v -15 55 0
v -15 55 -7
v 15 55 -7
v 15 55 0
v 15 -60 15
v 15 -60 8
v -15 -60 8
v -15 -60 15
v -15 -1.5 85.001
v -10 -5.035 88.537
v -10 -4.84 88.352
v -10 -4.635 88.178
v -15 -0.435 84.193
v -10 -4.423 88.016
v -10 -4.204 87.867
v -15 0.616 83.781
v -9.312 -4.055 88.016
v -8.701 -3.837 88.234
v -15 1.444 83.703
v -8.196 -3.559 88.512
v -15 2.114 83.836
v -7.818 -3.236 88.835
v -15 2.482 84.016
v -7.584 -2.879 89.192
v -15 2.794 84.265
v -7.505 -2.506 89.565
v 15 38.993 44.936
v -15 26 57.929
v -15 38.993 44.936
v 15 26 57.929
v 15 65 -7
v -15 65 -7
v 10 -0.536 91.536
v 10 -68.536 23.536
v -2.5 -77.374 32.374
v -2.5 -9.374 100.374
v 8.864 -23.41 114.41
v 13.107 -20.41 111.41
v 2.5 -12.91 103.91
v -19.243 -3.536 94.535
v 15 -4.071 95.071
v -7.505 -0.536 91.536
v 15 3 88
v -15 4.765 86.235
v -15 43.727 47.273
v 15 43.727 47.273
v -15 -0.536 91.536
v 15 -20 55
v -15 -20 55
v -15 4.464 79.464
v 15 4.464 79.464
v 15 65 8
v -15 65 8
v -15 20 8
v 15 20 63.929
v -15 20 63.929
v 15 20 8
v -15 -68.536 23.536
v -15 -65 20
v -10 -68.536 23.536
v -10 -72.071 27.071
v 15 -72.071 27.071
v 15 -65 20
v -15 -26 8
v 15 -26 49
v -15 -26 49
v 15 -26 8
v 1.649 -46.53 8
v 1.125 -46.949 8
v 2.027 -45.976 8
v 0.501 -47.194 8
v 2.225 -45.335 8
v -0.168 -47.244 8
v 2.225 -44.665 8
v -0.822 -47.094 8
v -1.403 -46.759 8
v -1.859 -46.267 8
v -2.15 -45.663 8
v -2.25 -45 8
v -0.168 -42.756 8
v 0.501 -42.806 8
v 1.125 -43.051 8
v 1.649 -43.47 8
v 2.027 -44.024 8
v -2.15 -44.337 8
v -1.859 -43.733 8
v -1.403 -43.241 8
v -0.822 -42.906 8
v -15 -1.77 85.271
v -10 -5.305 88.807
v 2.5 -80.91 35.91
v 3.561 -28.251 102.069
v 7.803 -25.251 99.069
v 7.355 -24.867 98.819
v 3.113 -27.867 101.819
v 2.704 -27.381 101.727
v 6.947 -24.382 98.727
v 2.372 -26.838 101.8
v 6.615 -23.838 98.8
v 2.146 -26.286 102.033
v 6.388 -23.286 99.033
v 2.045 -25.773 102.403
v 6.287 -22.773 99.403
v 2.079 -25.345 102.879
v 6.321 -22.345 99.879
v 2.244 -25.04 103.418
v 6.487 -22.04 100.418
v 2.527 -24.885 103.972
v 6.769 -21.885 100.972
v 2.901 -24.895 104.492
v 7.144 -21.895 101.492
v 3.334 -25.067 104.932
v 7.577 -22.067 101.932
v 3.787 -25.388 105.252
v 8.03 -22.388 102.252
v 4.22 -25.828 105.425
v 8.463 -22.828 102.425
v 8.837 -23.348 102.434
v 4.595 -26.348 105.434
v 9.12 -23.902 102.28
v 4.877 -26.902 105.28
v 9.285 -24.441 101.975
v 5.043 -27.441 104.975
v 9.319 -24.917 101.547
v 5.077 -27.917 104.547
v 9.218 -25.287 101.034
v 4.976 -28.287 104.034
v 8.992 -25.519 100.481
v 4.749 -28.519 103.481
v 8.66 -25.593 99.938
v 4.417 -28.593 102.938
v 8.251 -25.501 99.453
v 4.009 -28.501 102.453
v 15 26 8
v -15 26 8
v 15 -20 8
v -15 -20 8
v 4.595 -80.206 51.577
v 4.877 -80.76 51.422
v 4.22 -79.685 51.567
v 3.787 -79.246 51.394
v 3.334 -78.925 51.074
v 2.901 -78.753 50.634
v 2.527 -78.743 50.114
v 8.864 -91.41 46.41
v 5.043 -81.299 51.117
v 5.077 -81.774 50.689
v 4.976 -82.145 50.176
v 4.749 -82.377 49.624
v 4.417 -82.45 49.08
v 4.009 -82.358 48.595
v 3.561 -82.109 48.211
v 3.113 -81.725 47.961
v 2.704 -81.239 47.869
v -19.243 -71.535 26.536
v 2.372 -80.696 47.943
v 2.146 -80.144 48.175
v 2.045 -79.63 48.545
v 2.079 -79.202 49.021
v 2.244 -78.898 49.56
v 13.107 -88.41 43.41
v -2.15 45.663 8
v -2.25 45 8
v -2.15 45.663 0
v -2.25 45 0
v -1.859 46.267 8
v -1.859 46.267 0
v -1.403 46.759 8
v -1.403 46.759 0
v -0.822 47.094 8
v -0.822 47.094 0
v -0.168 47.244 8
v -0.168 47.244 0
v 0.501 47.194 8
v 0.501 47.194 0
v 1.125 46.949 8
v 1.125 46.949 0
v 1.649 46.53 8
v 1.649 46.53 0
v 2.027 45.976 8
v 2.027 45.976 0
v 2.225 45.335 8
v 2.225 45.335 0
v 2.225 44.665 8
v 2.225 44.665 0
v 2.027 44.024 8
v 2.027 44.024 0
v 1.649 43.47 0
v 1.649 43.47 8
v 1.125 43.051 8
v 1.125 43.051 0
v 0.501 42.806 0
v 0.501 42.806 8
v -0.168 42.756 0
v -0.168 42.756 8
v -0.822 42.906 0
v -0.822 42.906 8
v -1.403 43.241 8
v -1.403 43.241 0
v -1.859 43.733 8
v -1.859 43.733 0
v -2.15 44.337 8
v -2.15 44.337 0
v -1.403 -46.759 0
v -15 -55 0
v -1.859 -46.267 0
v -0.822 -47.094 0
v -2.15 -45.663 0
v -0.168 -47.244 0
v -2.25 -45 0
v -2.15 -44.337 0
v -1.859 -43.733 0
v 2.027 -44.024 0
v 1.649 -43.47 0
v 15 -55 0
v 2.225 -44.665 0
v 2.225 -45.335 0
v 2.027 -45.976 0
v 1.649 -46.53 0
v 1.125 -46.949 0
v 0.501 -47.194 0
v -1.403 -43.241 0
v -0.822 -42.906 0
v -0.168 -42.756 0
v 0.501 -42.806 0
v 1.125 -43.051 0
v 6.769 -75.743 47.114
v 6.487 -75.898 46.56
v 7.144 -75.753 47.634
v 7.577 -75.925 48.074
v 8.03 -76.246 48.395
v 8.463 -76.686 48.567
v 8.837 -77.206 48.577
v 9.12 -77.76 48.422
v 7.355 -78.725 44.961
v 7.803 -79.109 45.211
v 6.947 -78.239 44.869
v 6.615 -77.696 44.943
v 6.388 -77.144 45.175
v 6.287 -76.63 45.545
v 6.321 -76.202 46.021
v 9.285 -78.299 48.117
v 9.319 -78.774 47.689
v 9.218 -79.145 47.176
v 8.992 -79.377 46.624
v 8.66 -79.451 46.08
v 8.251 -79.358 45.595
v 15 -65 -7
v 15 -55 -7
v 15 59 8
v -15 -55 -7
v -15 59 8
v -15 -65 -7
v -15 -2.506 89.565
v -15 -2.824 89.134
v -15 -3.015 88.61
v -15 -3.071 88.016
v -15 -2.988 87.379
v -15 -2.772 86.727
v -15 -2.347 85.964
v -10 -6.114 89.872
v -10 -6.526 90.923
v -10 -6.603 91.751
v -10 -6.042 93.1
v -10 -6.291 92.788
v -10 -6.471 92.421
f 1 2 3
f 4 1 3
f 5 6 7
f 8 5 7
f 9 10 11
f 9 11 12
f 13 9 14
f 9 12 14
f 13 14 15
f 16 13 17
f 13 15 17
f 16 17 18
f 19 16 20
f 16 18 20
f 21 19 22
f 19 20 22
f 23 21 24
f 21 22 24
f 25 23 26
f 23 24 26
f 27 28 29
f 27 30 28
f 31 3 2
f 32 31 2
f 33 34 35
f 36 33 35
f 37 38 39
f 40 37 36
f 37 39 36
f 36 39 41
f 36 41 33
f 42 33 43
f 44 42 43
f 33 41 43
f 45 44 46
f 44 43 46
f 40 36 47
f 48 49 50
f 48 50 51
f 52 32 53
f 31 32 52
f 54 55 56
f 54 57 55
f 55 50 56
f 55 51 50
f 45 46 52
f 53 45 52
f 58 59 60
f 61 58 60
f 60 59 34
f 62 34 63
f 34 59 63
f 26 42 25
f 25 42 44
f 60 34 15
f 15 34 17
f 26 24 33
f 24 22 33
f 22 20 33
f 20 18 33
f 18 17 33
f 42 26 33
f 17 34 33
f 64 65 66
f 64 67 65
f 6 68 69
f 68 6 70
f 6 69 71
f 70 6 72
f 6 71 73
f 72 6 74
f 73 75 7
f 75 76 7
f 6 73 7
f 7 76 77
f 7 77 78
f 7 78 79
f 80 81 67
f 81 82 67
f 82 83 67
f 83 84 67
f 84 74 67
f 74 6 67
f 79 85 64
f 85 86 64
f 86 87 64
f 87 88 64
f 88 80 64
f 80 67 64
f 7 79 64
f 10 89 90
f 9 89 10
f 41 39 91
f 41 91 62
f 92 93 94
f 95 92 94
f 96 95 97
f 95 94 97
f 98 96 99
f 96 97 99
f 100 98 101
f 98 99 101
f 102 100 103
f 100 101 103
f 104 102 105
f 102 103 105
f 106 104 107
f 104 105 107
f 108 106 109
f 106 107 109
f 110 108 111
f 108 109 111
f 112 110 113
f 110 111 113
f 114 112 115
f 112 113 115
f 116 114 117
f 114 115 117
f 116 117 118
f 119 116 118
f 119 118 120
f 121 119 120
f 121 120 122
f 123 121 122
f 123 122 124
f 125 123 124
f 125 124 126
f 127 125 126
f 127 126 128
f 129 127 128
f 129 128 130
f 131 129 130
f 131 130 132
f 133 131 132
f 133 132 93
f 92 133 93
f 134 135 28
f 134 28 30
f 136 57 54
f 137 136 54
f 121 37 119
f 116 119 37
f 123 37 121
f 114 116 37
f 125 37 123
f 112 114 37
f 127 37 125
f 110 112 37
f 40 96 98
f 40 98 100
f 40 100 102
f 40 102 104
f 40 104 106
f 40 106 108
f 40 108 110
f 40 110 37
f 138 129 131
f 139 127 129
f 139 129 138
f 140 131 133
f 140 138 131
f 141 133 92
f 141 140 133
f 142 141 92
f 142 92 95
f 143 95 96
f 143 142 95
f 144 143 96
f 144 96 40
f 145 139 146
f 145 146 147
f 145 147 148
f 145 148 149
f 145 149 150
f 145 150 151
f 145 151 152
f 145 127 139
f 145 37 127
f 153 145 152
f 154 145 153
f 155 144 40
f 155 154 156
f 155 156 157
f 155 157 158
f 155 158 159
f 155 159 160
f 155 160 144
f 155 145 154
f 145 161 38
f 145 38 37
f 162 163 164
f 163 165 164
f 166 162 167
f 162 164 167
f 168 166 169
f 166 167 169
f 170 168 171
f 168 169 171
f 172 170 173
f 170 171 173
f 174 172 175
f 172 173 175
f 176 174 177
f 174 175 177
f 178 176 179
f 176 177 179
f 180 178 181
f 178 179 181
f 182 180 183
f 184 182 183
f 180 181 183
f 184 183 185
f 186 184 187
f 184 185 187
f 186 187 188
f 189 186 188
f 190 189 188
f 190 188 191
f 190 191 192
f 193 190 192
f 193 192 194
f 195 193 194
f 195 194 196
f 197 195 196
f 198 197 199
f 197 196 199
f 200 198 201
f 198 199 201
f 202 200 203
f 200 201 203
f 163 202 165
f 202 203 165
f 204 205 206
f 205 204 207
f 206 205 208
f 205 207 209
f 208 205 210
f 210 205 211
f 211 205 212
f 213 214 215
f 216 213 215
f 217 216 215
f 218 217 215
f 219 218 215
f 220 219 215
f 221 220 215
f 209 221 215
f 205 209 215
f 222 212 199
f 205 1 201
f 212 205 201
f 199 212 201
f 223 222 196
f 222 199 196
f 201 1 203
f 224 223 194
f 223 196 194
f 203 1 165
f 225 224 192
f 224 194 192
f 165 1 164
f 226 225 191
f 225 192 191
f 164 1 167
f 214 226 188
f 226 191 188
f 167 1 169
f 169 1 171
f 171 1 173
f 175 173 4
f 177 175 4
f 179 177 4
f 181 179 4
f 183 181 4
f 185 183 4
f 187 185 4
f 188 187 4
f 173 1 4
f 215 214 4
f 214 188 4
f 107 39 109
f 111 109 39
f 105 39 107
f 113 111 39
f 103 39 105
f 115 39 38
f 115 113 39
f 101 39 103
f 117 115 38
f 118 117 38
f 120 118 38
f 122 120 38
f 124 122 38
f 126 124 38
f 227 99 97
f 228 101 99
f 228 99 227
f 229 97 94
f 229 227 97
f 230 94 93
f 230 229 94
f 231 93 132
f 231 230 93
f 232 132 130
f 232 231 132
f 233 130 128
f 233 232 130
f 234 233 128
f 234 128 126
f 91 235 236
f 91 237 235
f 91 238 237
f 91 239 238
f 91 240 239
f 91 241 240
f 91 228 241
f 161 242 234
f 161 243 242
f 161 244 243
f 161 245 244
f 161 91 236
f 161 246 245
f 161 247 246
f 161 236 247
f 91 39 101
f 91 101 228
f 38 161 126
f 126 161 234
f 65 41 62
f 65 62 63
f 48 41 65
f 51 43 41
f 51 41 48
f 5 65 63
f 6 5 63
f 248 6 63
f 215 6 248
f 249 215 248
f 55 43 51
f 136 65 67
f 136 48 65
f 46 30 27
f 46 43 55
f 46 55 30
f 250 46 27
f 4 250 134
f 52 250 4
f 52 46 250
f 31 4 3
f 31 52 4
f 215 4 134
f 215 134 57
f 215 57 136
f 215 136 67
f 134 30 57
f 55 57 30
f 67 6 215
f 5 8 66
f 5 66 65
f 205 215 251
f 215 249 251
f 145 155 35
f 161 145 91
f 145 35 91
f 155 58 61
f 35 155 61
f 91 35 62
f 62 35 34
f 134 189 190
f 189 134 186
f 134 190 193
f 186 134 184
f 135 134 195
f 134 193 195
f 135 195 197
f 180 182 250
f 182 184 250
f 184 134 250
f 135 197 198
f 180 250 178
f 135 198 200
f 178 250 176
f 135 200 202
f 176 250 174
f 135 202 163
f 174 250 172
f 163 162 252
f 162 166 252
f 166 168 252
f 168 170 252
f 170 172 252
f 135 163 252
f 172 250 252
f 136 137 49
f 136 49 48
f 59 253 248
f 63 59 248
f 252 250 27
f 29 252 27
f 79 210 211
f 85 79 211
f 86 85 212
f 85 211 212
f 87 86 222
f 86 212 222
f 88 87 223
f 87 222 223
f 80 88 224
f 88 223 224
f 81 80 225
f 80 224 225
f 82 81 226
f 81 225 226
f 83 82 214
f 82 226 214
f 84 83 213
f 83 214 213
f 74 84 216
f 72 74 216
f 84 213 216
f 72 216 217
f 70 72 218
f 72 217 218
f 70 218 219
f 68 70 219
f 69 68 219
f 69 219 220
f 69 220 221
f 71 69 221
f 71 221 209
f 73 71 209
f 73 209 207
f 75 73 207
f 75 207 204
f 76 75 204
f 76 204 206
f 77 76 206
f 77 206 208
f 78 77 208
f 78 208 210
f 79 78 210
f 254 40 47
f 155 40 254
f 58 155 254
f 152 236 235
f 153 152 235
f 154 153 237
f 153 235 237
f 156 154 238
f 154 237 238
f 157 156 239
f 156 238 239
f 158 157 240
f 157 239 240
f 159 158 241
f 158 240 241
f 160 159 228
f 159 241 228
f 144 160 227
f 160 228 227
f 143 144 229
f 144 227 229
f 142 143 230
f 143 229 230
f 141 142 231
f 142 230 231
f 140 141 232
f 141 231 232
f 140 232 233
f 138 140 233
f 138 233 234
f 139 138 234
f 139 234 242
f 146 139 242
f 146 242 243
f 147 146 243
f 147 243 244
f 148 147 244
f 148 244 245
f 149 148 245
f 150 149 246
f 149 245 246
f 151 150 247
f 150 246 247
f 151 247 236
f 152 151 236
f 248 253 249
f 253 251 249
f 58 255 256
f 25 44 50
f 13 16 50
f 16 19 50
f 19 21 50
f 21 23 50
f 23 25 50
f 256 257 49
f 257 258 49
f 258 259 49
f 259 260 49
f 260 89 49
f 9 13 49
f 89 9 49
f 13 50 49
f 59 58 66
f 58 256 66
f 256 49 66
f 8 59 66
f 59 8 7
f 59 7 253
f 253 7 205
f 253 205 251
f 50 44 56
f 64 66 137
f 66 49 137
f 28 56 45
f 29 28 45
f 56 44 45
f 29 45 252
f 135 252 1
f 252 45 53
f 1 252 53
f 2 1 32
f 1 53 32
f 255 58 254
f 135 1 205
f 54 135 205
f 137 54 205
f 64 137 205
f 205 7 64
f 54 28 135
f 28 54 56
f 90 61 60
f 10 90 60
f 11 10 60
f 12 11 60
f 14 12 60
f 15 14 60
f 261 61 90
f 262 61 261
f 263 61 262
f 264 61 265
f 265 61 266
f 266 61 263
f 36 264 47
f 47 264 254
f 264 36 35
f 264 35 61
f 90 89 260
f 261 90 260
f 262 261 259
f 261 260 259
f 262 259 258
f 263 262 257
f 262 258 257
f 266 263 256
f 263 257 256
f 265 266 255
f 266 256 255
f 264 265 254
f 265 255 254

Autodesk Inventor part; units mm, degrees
ref_plane "YZ Plane" through (0, 0, 0) normal (1, 0, 0) x (0, 1, 0)
ref_plane "XZ Plane" through (0, 0, 0) normal (0, 1, 0) x (-1, 0, 0)
ref_plane "XY Plane" through (0, 0, 0) normal (0, 0, 1) x (1, 0, 0)
ref_plane "Arbeitsebene1" through (0, 0, 0) normal (0, 0, 1) x (1, 0, 0)
sketch "Skizze1" plane through (0, 0, 0) normal (0, 0, 1) x (1, 0, 0)
  line L0 (15, 55) -> (-15, 55) projected
  line L1 (-15, 55) -> (-15, -55) projected
  line L2 (-15, -55) -> (15, -55) projected
  line L3 (15, -55) -> (15, 55) projected
  circle A0 centre (0, 45) radius 5 projected
  circle A1 centre (0, -45) radius 5 projected
  line L4 (15, 55) -> (-15, 55) projected
  line L5 (-15, 55) -> (-15, -55) projected
  line L6 (-15, -55) -> (15, -55) projected
  line L7 (15, -55) -> (15, 55) projected
  circle A2 centre (0, 45) radius 5 projected
  circle A3 centre (0, -45) radius 5 projected
  point P0 (0, 0)
ref_plane "Arbeitsebene2" through (0, -55, -5) normal (0, -1, 0) x (-1, 0, 0)
sketch "Skizze2" plane through (0, -55, -5) normal (0, -1, 0) x (-1, 0, 0)
  line L0 (15, 2) -> (-15, 2) projected
  line L1 (-15, 2) -> (-15, -2) projected
  line L2 (-15, -2) -> (-15, -5) projected
  line L3 (15, -5) -> (-15, -5) projected
  line L4 (15, 2) -> (15, -5) projected
  point P0 (0, -5)
extrude "Extrusion1" add sketch "Skizze2" along normal blind 10
sketch "Skizze3" plane through (-15, -55, 0) normal (0, 0, 1) x (1, 0, 0)
  line L0 (0, -10) -> (30, -10) projected
  line L1 (30, 0) -> (30, -10) projected
  line L2 (0, -10) -> (30, -10)
  line L3 (30, -10) -> (30, -5)
  line L4 (30, -5) -> (0, -5)
  line L5 (0, -5) -> (0, -10)
  point P0 (15, 55)
  dimension "d2" = 5
ref_plane "Arbeitsebene3" through (0, 55, -5) normal (0, 1, 0) x (1, 0, 0)
sketch "Skizze4" plane through (0, 55, -5) normal (0, 1, 0) x (1, 0, 0)
  line L0 (15, 2) -> (15, -5) projected
  line L1 (15, 2) -> (-15, 2) projected
  line L2 (-15, 2) -> (-15, -5) projected
  line L3 (15, -5) -> (-15, -5) projected
  point P0 (0, -5)
extrude "Extrusion2" add sketch "Skizze4" along normal blind 10
sketch "Skizze5" plane through (-15, 55, 0) normal (0, 0, 1) x (1, 0, 0)
  line L0 (0, 10) -> (30, 10) projected
  line L1 (0, 0) -> (0, 10) projected
  line L2 (30, 10) -> (0, 10)
  line L3 (0, 10) -> (0, 5)
  line L4 (0, 5) -> (30, 5)
  line L5 (30, 5) -> (30, 10)
  point P0 (15, -55)
  dimension "d5" = 5
extrude "Extrusion3" add sketch "Skizze3" along normal blind 20
sketch "Skizze6" plane through (15, -55, 0) normal (1, 0, 0) x (0, 0, -1)
  line L0 (7, -10) -> (-20, -10) projected
  line L1 (-20, -10) -> (-15, -5)
  line L2 (0, -5) -> (-20, -5) projected
  line L3 (-20, -10) -> (-12.9289, -10) construction
  line L4 (-20, -5) -> (-20, -10)
  point P0 (0, 55)
  dimension "d8" = 45
extrude "Extrusion4" cut sketch "Skizze6" against normal blind 46
sketch "Skizze7" plane through (-15, -60, 15) normal (0, 0.7071068, 0.7071068) x (1, 0, 0)
  line L0 (0, -7.0711) -> (0, 0) projected
  line L1 (0, -7.0711) -> (30, -7.0711) projected
  line L2 (30, 0) -> (30, -7.0711) projected
  line L3 (0, 0) -> (30, 0) projected
  point P0 (15, 53.033)
extrude "Extrusion5" add sketch "Skizze7" along normal blind 166
extrude "Extrusion6" add sketch "Skizze5" along normal blind 166
sketch "Skizze8" plane through (-15, 60, 0) normal (0, -1, 0) x (1, 0, 0)
  line L0 (30, 0) -> (0, 0) projected
  line L1 (30, 0) -> (30, 166) projected
  line L2 (0, 166) -> (30, 166) projected
  line L3 (0, 0) -> (0, 166) projected
  line L4 (0, 0) -> (0, 80)
  line L5 (0, 0) -> (0, 166) projected
  line L6 (0, 80) -> (30, 80)
  line L7 (0, 80) -> (30, 80)
  line L8 (30, 80) -> (30, 88)
  line L9 (30, 88) -> (0, 88)
  line L10 (0, 88) -> (0, 80)
  point P0 (15, 0)
  dimension "d15" = 80
  dimension "d16" = 8
extrude "Extrusion7" add sketch "Skizze8" along normal blind 57 contours L6 L3 L9 L1
sketch "Skizze9" plane through (-15, -65, -7) normal (-1, 0, 0) x (0, 0, 1)
  line L0 (27, 0) -> (144.3797, 117.3797) projected
  line L1 (139.3797, 122.3797) -> (144.3797, 117.3797) projected
  line L2 (95, 78) -> (139.3797, 122.3797) projected
  line L3 (95, 125) -> (95, 78) projected
  line L4 (95, 125) -> (173, 125) projected
  line L5 (173, 130) -> (173, 125) projected
  line L6 (0, 130) -> (173, 130) projected
  line L7 (0, 120) -> (0, 130) projected
  line L8 (0, 120) -> (7, 120) projected
  line L9 (7, 120) -> (7, 125) projected
  line L10 (7, 125) -> (87, 125) projected
  line L11 (87, 125) -> (87, 70) projected
  line L12 (22, 5) -> (87, 70) projected
  line L13 (7, 5) -> (22, 5) projected
  line L14 (7, 10) -> (7, 5) projected
  line L15 (7, 10) -> (0, 10) projected
  line L16 (0, 10) -> (0, 0) projected
  line L17 (0, 0) -> (27, 0) projected
  line L18 (95, 125) -> (95, 130)
  line L19 (95, 125) -> (95, 78) projected
  line L20 (95, 78) -> (95, 68)
  point P0 (7, 65)
extrude "Extrusion8" cut sketch "Skizze9" against normal blind 61.5 contours L20 L2 L1 L0 | L18 L6 L5 L4
sketch "Skizze10" plane through (-15, 60, 0) normal (0, -1, 0) x (1, 0, 0)
  line L0 (30, 0) -> (30, 80) projected
  line L1 (0, 0) -> (30, 0)
  line L2 (30, 0) -> (30, 8)
  line L3 (30, 8) -> (0, 8)
  line L4 (0, 8) -> (0, 0)
  point P0 (15, 0)
  dimension "d21" = 8
extrude "Extrusion9" add sketch "Skizze10" along normal blind 123.5
sketch "Skizze12" plane through (-15, 60, 8) normal (0, 0, 1) x (1, 0, 0)
  line L0 (30, -120) -> (0, -120) projected
  line L1 (30, 0) -> (30, -120) projected
  line L2 (0, 0) -> (30, 0) projected
  line L3 (0, 0) -> (0, -120) projected
  line L4 (15, -60) -> (30, -60)
  line L5 (30, 0) -> (30, -120) projected
  line L6 (30, -60) -> (30, -40)
  line L7 (30, -40) -> (30, -80)
  line L8 (0, 0) -> (0, -120) projected
  line L9 (30, -40) -> (0, -40)
  line L10 (0, -40) -> (0, -34)
  line L11 (0, -34) -> (30, -34)
  line L12 (30, -34) -> (30, -40)
  line L13 (30, -80) -> (0, -80)
  line L14 (0, -80) -> (0, -86)
  line L15 (0, -86) -> (30, -86)
  line L16 (30, -86) -> (30, -80)
  dimension "d26" = 20
  dimension "d27" = 40
  dimension "d28" = 6
  dimension "d29" = 6
extrude "Extrusion11" add sketch "Skizze12" along normal blind 76.5 contours L3 L11 L1 L9
sketch "Skizze13" plane through (-15, -60, 8) normal (0, 0, 1) x (1, 0, 0)
  line L0 (0, 80) -> (0, 40)
  line L1 (0, 80) -> (0, 0) projected
  line L2 (30, 80) -> (30, 0) projected
  line L3 (0, 40) -> (30, 40)
  line L4 (30, 40) -> (30, 34)
  line L5 (30, 34) -> (0, 34)
  line L6 (0, 34) -> (0, 40)
  point P0 (15, 60)
  point P1 (0, 34)
  point P2 (30, 40)
  dimension "d32" = 40
  dimension "d33" = 6
extrude "Extrusion12" add sketch "Skizze13" along normal blind 49.25
sketch "Skizze31" plane through (0, 0, 0) normal (0, 0, 1) x (1, 0, 0)
  point P0 (0, 0)
sketch "Skizze41" plane through (-15, -65, 20) normal (0, -0.7071068, 0.7071068) x (1, 0, 0)
  line L0 (30, 96.1665) -> (0, 96.1665) projected
  line L1 (0, 0) -> (0, 96.1665) projected
  line L2 (0, 0) -> (30, 0) projected
  line L3 (30, 0) -> (30, 96.1665) projected
  line L4 (0, 96.1665) -> (5, 96.1665)
  line L5 (5, 96.1665) -> (5, 0)
  line L6 (5, 0) -> (0, 0)
  line L7 (0, 0) -> (0, 96.1665)
  line L8 (30, 96.1665) -> (0, 96.1665) projected
  line L9 (30, 96.1665) -> (25, 96.1665)
  line L10 (25, 96.1665) -> (25, 0)
  line L11 (25, 0) -> (30, 0)
  line L12 (30, 0) -> (30, 96.1665)
  point P0 (15, 31.8198)
  dimension "d88" = 5
  dimension "d89" = 5
extrude "Extrusion34" add sketch "Skizze41" along normal blind 10 contours L3 L2 L10 L0 | L5 L2 L1 L0
sketch "Skizze42" plane through (-10, -65, 20) normal (0, -0.7071068, -0.7071068) x (-1, 0, 0)
  line L0 (5, 0) -> (0, 0) projected
  line L1 (0, 0) -> (0, -10) projected
  line L2 (5, -10) -> (0, -10) projected
  line L3 (5, 0) -> (5, -10) projected
  line L4 (-20, 0) -> (-25, 0) projected
  line L5 (-25, 0) -> (-25, -10) projected
  line L6 (-20, -10) -> (-25, -10) projected
  line L7 (-20, 0) -> (-20, -10) projected
  line L8 (0, -10) -> (5, -5)
  line L9 (-25, -10) -> (-20, -5)
  point P0 (-10, 60.1041)
extrude "Extrusion35" cut sketch "Skizze42" against normal blind 136 contours L3 L2 L8 | L7 L6 L9
sketch "Skizze43" plane through (-15, 3, 88) normal (0, 0.7071068, 0.7071068) x (1, 0, 0)
  line L0 (0, -5) -> (5, -10) projected
  line L1 (5, 0) -> (5, -10) projected
  line L2 (5, 0) -> (0, 0) projected
  line L3 (0, 0) -> (0, -5) projected
  line L4 (25, -5) -> (30, -10) projected
  line L5 (30, 0) -> (30, -10) projected
  line L6 (30, 0) -> (25, 0) projected
  line L7 (25, 0) -> (25, -5) projected
  point P0 (15, 60.1041)
extrude "Extrusion36" add sketch "Skizze43" along normal blind 45
sketch "Skizze48" plane through (-10, -65, 20) normal (0, -0.7071068, -0.7071068) x (-1, 0, 0)
  point P0 (-10, 60.1041)
sketch "Skizze49" plane through (-10, -65, 20) normal (0, -0.7071068, -0.7071068) x (-1, 0, 0)
  line L0 (-20, 0) -> (-20, -5) projected
  line L1 (-20, 0) -> (-25, 0) projected
  line L2 (-25, 0) -> (-25, -10) projected
  line L3 (5, 0) -> (5, -5) projected
  line L4 (5, 0) -> (0, 0) projected
  line L5 (0, 0) -> (0, -10) projected
  line L6 (44.1188, -44.1188) -> (39.1188, -49.1188)
  line L7 (31.6188, -56.6188) -> (26.6188, -61.6188)
  line L8 (-25, -10) -> (-20, -5) projected
  line L9 (0, -10) -> (5, -5) projected
  point P0 (-10, 60.1041)
extrude "Extrusion41" [suppressed]
sketch "Skizze50" plane through (-15, 34.8198, 119.8198) normal (0, 0.7071068, 0.7071068) x (1, 0, 0)
  line L0 (25, 0) -> (25, -5) projected
  line L1 (5, -10) -> (5, 0) projected
  line L2 (5, 0) -> (0, 0) projected
  line L3 (0, 0) -> (0, -5) projected
  line L4 (30, -10) -> (30, 0) projected
  line L5 (30, 0) -> (25, 0) projected
  line L6 (-34.1188, -49.1188) -> (-39.1188, -44.1188) projected
  line L7 (-21.6188, -61.6188) -> (-26.6188, -56.6188) projected
  line L8 (25, -5) -> (30, -10) projected
  line L9 (0, -5) -> (5, -10) projected
  point P0 (15, 60.1041)
extrude "Extrusion42" [suppressed]
sketch "Skizze51" plane through (15, 3, 88) normal (0, 0.7071068, -0.7071068) x (-1, 0, 0)
  line L0 (0, 0) -> (5, 0) projected
  line L1 (5, 0) -> (5, 45) projected
  line L2 (0, 45) -> (5, 45) projected
  line L3 (0, 0) -> (0, 45) projected
  line L4 (25, 0) -> (30, 0) projected
  line L5 (30, 0) -> (30, 45) projected
  line L6 (25, 45) -> (30, 45) projected
  line L7 (25, 0) -> (25, 45) projected
  line L8 (5, -96.1665) -> (5, 45) projected
  line L9 (0, 45) -> (5, 45)
  line L10 (5, 45) -> (5, 40)
  line L11 (5, 40) -> (0, 40)
  line L12 (0, 40) -> (0, 45)
  line L13 (25, 45) -> (30, 45) projected
  line L14 (25, 45) -> (30, 45)
  line L15 (30, 45) -> (30, 40)
  line L16 (30, 40) -> (25, 40)
  line L17 (25, 40) -> (25, 45)
  point P0 (15, -64.3467)
  point P1 (25, 40)
  point P2 (0, 40)
  point P3 (5, 40)
  dimension "d109" = 5
  dimension "d110" = 5
extrude "Extrusion43" add sketch "Skizze51" along normal blind 10 contours L3 L2 L1 L11 | L7 L6 L5 L16
sketch "Skizze52" plane through (15, -65, 20) normal (1, 0, 0) x (0, 0.7071068, -0.7071068)
  line L0 (0, 0) -> (0, 96.1665) projected
  line L1 (0, 96.1665) -> (0, 136.1665) projected
  line L2 (0, 136.1665) -> (10, 136.1665) projected
  line L3 (10, 141.1665) -> (10, 136.1665) projected
  line L4 (-10, 141.1665) -> (10, 141.1665) projected
  line L5 (-10, 0) -> (-10, 96.1665) projected
  line L6 (0, 0) -> (-10, 0) projected
  line L7 (-5, 141.1665) -> (10, 141.1665) projected
  line L8 (10, 141.1665) -> (5, 136.1665)
  line L9 (-10, 96.1665) -> (-10, 141.1665) projected
  point P0 (60.1041, 31.8198)
extrude "Extrusion44" cut sketch "Skizze52" against normal blind 46.25 contours L8 L3 L2
sketch "Skizze53" plane through (15, 34.8198, 112.7487) normal (0, 0, -1) x (-1, 0, 0)
  line L0 (5, 7.0711) -> (5, 0) projected
  line L1 (5, 7.0711) -> (0, 7.0711) projected
  line L2 (0, 0) -> (0, 7.0711) projected
  line L3 (5, 0) -> (0, 0) projected
  line L4 (25, 0) -> (25, 7.0711) projected
  line L5 (30, 0) -> (25, 0) projected
  line L6 (30, 7.0711) -> (30, 0) projected
  line L7 (30, 7.0711) -> (25, 7.0711) projected
  point P0 (15, -34.8198)
extrude "Extrusion45" add sketch "Skizze53" along normal blind 29.25
sketch "Skizze55" plane through (10, 34.8198, 112.7487) normal (0, -1, 0) x (1, 0, 0)
  line L0 (-20, -24.7487) -> (-25, -24.7487) projected
  line L1 (-20, 0) -> (-20, -24.7487) projected
  line L2 (-25, 0) -> (-20, 0) projected
  line L3 (-25, 0) -> (-25, -24.7487) projected
  line L4 (5, -24.7487) -> (0, -24.7487) projected
  line L5 (5, 0) -> (5, -24.7487) projected
  line L6 (0, 0) -> (5, 0) projected
  line L7 (0, 0) -> (0, -24.7487) projected
  line L8 (5, 0) -> (5, -24.7487) projected
  line L9 (0, 0) -> (0, -24.7487) projected
  line L10 (5, -12.3744) -> (0, -12.3744)
  line L11 (0, -12.3744) -> (0, -7.3744)
  line L12 (0, -7.3744) -> (5, -7.3744)
  line L13 (5, -7.3744) -> (5, -12.3744)
  line L14 (-20, 0) -> (-20, -24.7487) projected
  line L15 (-25, 0) -> (-25, -24.7487) projected
  line L16 (-20, -12.3744) -> (-25, -12.3744)
  line L17 (-25, -12.3744) -> (-25, -17.3744)
  line L18 (-25, -17.3744) -> (-20, -17.3744)
  line L19 (-20, -17.3744) -> (-20, -12.3744)
  line L20 (5, -12.3744) -> (0, -12.3744)
  line L21 (0, -12.3744) -> (0, -17.3744)
  line L22 (0, -17.3744) -> (5, -17.3744)
  line L23 (5, -17.3744) -> (5, -12.3744)
  point P0 (-10, -112.7487)
  point P1 (0, -17.3744)
  point P2 (5, -17.3744)
  point P3 (5, -12.3744)
  point P4 (0, -12.3744)
  point P5 (-25, -17.3744)
  point P6 (-20, -17.3744)
  point P7 (-20, -12.3744)
  point P8 (-25, -12.3744)
  dimension "d124" = 5
  dimension "d125" = 5
extrude "Extrusion47" add sketch "Skizze55" along normal blind 26 contours L18 L3 L16 L1 | L22 L7 L10 L5
sketch "Skizze57" plane through (10, 34.8198, 88) normal (-1, 0, 0) x (0, 0, 1)
  line L0 (24.7487, 0) -> (12.3744, 0) projected
  line L1 (28.2843, -3.5355) -> (24.7487, 0) projected
  line L2 (12.3744, -19.4454) -> (28.2843, -3.5355) projected
  line L3 (12.3744, 0) -> (12.3744, -19.4454) projected
  line L4 (7.3744, 0) -> (7.3744, -24.4454) projected
  line L5 (0, -31.8198) -> (7.3744, -24.4454) projected
  line L6 (-68, -99.8198) -> (0, -31.8198) projected
  line L7 (-68, -99.8198) -> (-64.4645, -103.3553) projected
  line L8 (35.3553, -3.5355) -> (24.7487, 7.0711) projected
  line L9 (24.7487, 7.0711) -> (0, 7.0711) projected
  line L10 (0, 0) -> (0, 7.0711) projected
  line L11 (7.3744, 0) -> (0, 0) projected
  line L12 (35.3553, -3.5355) -> (31.8198, -7.0711)
  line L13 (31.8198, -7.0711) -> (28.2843, -3.5355)
  line L14 (28.2843, -3.5355) -> (31.8198, 0)
  line L15 (12.3744, 0) -> (7.3744, 0)
  line L16 (7.3744, 0) -> (7.3744, 7.0711)
  line L17 (7.3744, 7.0711) -> (12.3744, 7.0711)
  line L18 (12.3744, 7.0711) -> (12.3744, 0)
  line L19 (-64.4645, -103.3553) -> (3.5355, -35.3553) projected
  line L20 (3.5355, -35.3553) -> (35.3553, -3.5355) projected
  point P0 (-88, -34.8198)
  point P1 (12.3744, 7.0711)
  point P2 (31.8198, -7.0711)
  dimension "d138" = 5
extrude "Extrusion49" add sketch "Skizze57" along normal blind 23.5
sketch "Skizze73" plane through (15, -65, -7) normal (1, 0, 0) x (0, 0, -1)
  line L0 (-15, 91) -> (-87, 91) projected
  line L1 (-87, 125) -> (-87, 91) projected
  line L2 (-15, 125) -> (-87, 125) projected
  line L3 (-15, 125) -> (-15, 91) projected
  line L4 (-95, 106.8909) -> (-95, 99.8198) projected
  line L5 (-95, 99.8198) -> (-95, 78) projected
  line L6 (-87, 70) -> (-95, 78) projected
  line L7 (-87, 85) -> (-87, 70) projected
  line L8 (-15, 85) -> (-87, 85) projected
  line L9 (-15, 85) -> (-15, 45) projected
  line L10 (-15, 45) -> (-62, 45) projected
  line L11 (-56, 39) -> (-62, 45) projected
  line L12 (-15, 39) -> (-56, 39) projected
  line L13 (-15, 39) -> (-15, 5) projected
  line L14 (-15, 5) -> (-22, 5) projected
  line L15 (-22, 5) -> (-27, 0) projected
  line L16 (0, 0) -> (-27, 0) projected
  line L17 (0, 10) -> (0, 0) projected
  line L18 (0, 10) -> (-7, 10) projected
  line L19 (-7, 120) -> (-7, 10) projected
  line L20 (-7, 120) -> (0, 120) projected
  line L21 (0, 120) -> (0, 130) projected
  line L22 (0, 130) -> (-95, 130) projected
  line L23 (-95, 130) -> (-95, 106.8909) projected
  line L24 (-95, 106.8909) -> (-95, 99.8198) projected
  line L25 (-119.7487, 106.8909) -> (-95, 106.8909) projected
  line L26 (-119.7487, 99.8198) -> (-119.7487, 106.8909) projected
  line L27 (-119.7487, 99.8198) -> (-107.3744, 99.8198) projected
  line L28 (-107.3744, 99.8198) -> (-102.3744, 99.8198) projected
  line L29 (-102.3744, 99.8198) -> (-95, 99.8198) projected
  line L30 (-102.3744, 75.3744) -> (-107.3744, 80.3744) projected
  line L31 (-107.3744, 80.3744) -> (-123.2843, 96.2843) projected
  line L32 (-123.2843, 96.2843) -> (-119.7487, 99.8198) projected
  line L33 (-119.7487, 99.8198) -> (-119.7487, 106.8909) projected
  line L34 (-133.8909, 92.7487) -> (-119.7487, 106.8909) projected
  line L35 (-102.0711, 60.9289) -> (-133.8909, 92.7487) projected
  line L36 (-34.0711, -7.0711) -> (-102.0711, 60.9289) projected
  line L37 (-27, 0) -> (-34.0711, -7.0711) projected
  line L38 (-27, 0) -> (-95, 68) projected
  line L39 (-95, 68) -> (-102.3744, 75.3744) projected
  line L40 (-102.3744, 75.3744) -> (-107.3744, 80.3744) projected
  line L41 (-102.3744, 99.8198) -> (-102.3744, 75.3744) projected
  line L42 (-107.3744, 99.8198) -> (-102.3744, 99.8198) projected
  line L43 (-107.3744, 99.8198) -> (-107.3744, 80.3744) projected
  line L44 (-15, 125) -> (-15, 130)
  line L45 (-87, 125) -> (-87, 91) projected
  line L46 (-87, 91) -> (-109.5711, 68.4289)
  point P0 (-7, 65)
  point P1 (-95, 83)
  point P2 (-102.5, 75.5)
extrude "Extrusion64" cut sketch "Skizze73" against normal blind 119 contours L46 L5 L4 L23 L22 L44 L2 L1 | L29 L28 L27 L26 L25 L4 | L46 L30 L43 L28 L41 | L41 L30 L46 | L46 L35 L34 L26 L32 L31 L30 | L43 L31 L32 L27
sketch "Skizze74" plane through (15, -65, -7) normal (1, 0, 0) x (0, 0, -1)
  line L0 (-15, 91) -> (-87, 91) projected
  line L1 (-15, 91) -> (-15, 130) projected
  line L2 (-87, 91) -> (-15, 130)
  line L3 (-15, 130) -> (-87, 91)
  line L4 (-87, 91) -> (-82, 91)
  line L5 (-15, 130) -> (-15, 124)
  line L6 (-15, 130) -> (-15, 91) projected
  line L7 (-15, 91) -> (-87, 91) projected
  line L8 (-87, 91) -> (-95, 83) projected
  line L9 (-95, 83) -> (-95, 78) projected
  line L10 (-87, 70) -> (-95, 78) projected
  line L11 (-87, 85) -> (-87, 70) projected
  line L12 (-15, 85) -> (-87, 85) projected
  line L13 (-15, 85) -> (-15, 45) projected
  line L14 (-15, 45) -> (-62, 45) projected
  line L15 (-56, 39) -> (-62, 45) projected
  line L16 (-15, 39) -> (-56, 39) projected
  line L17 (-15, 39) -> (-15, 5) projected
  line L18 (-15, 5) -> (-22, 5) projected
  line L19 (-22, 5) -> (-27, 0) projected
  line L20 (0, 0) -> (-27, 0) projected
  line L21 (0, 10) -> (0, 0) projected
  line L22 (0, 10) -> (-7, 10) projected
  line L23 (-7, 120) -> (-7, 10) projected
  line L24 (-7, 120) -> (0, 120) projected
  line L25 (0, 120) -> (0, 130) projected
  line L26 (0, 130) -> (-15, 130) projected
  line L27 (-15, 124) -> (-87, 85)
  point P0 (-7, 65)
  point P1 (-75.9231, 91)
  dimension "d195" = 5
  dimension "d196" = 6
extrude "Extrusion65" add sketch "Skizze74" against normal blind 30 contours L0 L2 L1 L27
sketch "Skizze75" plane through (-15, -65, -7) normal (-1, 0, 0) x (0, 0, 1)
  line L0 (15, 91) -> (75.9231, 91) projected
  line L1 (15, 91) -> (15, 124) projected
  line L2 (15, 124) -> (75.9231, 91) projected
  line L3 (87, 91) -> (15, 130) projected
  line L4 (0, 130) -> (15, 130) projected
  line L5 (0, 120) -> (0, 130) projected
  line L6 (0, 120) -> (7, 120) projected
  line L7 (7, 120) -> (7, 10) projected
  line L8 (7, 10) -> (0, 10) projected
  line L9 (0, 10) -> (0, 0) projected
  line L10 (0, 0) -> (27, 0) projected
  line L11 (27, 0) -> (30.5355, -3.5355) projected
  line L12 (30.5355, -3.5355) -> (106.0355, 71.9645) projected
  line L13 (106.0355, 71.9645) -> (102.5, 75.5) projected
  line L14 (95, 68) -> (102.5, 75.5) projected
  line L15 (95, 68) -> (95, 83) projected
  line L16 (95, 83) -> (87, 91) projected
  line L17 (15, 85) -> (15, 45) projected
  line L18 (15, 85) -> (87, 85) projected
  line L19 (87, 85) -> (87, 70) projected
  line L20 (62, 45) -> (87, 70) projected
  line L21 (15, 45) -> (62, 45) projected
  line L22 (15, 39) -> (56, 39) projected
  line L23 (22, 5) -> (56, 39) projected
  line L24 (15, 5) -> (22, 5) projected
  line L25 (15, 39) -> (15, 5) projected
  line L26 (109.5711, 68.4289) -> (106.0355, 71.9645) projected
  line L27 (30.5355, -3.5355) -> (106.0355, 71.9645) projected
  line L28 (34.0711, -7.0711) -> (30.5355, -3.5355) projected
  line L29 (34.0711, -7.0711) -> (109.5711, 68.4289) projected
  line L30 (95, 68) -> (102.0711, 60.9289)
  point P0 (7, 65)
extrude "Extrusion66" cut sketch "Skizze75" against normal blind 98.25 contours L14 L13 L12 L30 | L12 L26 L29 L30
sketch "Skizze76" plane through (-15, 3, 88) normal (0, 0.7071068, 0.7071068) x (1, 0, 0)
  line L0 (0, 36.0624) -> (0, 12.0208) projected
  line L1 (30, 0) -> (0, 0) projected
  line L2 (5, -10) -> (0, -5) projected
  line L3 (5, -5) -> (5, -10) projected
  line L4 (25, -5) -> (5, -5) projected
  line L5 (25, -5) -> (30, -10) projected
  line L6 (30, 0) -> (30, -10) projected
  line L7 (30, 0) -> (0, 0) projected
  line L8 (0, -5) -> (0, 0) projected
  line L9 (5, -10) -> (25, -30)
  line L10 (30, -10) -> (25, -5)
  line L11 (25, -5) -> (12.5, -17.5)
  line L12 (12.5, -17.5) -> (17.5, -22.5)
  line L13 (17.5, -22.5) -> (30, -10)
  line L14 (17.5, -22.5) -> (28.1066, -33.1066)
  line L15 (28.1066, -33.1066) -> (23.864, -37.3492)
  line L16 (0, -5) -> (28.1066, -33.1066)
  line L17 (28.1066, -33.1066) -> (23.864, -37.3492)
  line L18 (23.864, -37.3492) -> (-4.2426, -9.2426)
  line L19 (-4.2426, -9.2426) -> (0, -5)
  point P0 (15, 60.1041)
  point P1 (17.5, -22.5)
  point P2 (12.5, -17.5)
  point P3 (25, -30)
  dimension "d201" = 15
  dimension "d202" = 6
extrude "Extrusion67" add sketch "Skizze76" along normal blind 96.25 from surface at -96.1665 contours L13 L9 L11 L5 | L2 L9 L14 L15 L18 L19
sketch "Skizze77" plane through (15, -65, 20) normal (1, 0, 0) x (0, 0.7071068, -0.7071068)
  line L0 (0, 96.1665) -> (-10, 96.1665) projected
  line L1 (-10, 0) -> (-10, 96.1665) projected
  line L2 (0, 0) -> (-10, 0) projected
  line L3 (0, 0) -> (0, 96.1665) projected
  line L4 (-10, 96.1665) -> (-38.8061, 96.1665)
  line L5 (-38.8061, 96.1665) -> (-38.8061, 98.6326)
  line L6 (-38.8061, 98.6326) -> (-10, 98.6326)
  line L7 (-10, 98.6326) -> (-10, 96.1665)
  line L8 (-10, 98.6326) -> (0, 98.6326)
  line L9 (0, 98.6326) -> (0, 96.1665)
  point P0 (60.1041, 31.8198)
extrude "Extrusion68" cut sketch "Skizze77" against normal blind 125.75 contours L0 L7 L8 L9 | L4 L5 L6 L7
sketch "Skizze78" plane through (13.1066, -20.4099, 111.4099) normal (0.7071068, 0.5, -0.5) x (0, -0.7071068, -0.7071068)
  line L0 (0, 15) -> (0, 0) projected
  line L1 (96.1665, 0) -> (0, 0) projected
  line L2 (96.1665, 0) -> (96.1665, 15) projected
  line L3 (96.1665, 15) -> (0, 15) projected
  line L4 (0, 7.5) -> (15, 7.5)
  circle A0 centre (15, 7.5) radius 2.15
  line L5 (96.1665, 7.5) -> (81.1665, 7.5)
  circle A1 centre (81.1665, 7.5) radius 2.15
  line L6 (15, 7.5) -> (30, 7.5)
  circle A2 centre (30, 7.5) radius 2.15
  line L7 (0, 7.5) -> (10, 7.5)
  line L8 (96.1665, 7.5) -> (86.1665, 7.5)
  circle A3 centre (86.1665, 7.5) radius 2.15
  circle A4 centre (10, 7.5) radius 2.15
  point P0 (64.3467, 75.1777)
  dimension "d207" = 15
  dimension "d208" = 4.3
  dimension "d209" = 15
  dimension "d210" = 4.3
  dimension "d218" = 15
  dimension "d219" = 4.3
  dimension "d224" = 10
  dimension "d225" = 10
  dimension "d226" = 4.3
extrude "Extrusion69" cut sketch "Skizze78" against normal blind 125.75 contours L4 A4 | L4 A4 | A3 L5 | L5 A3
sketch "Skizze79" plane through (15, -65, 20) normal (1, 0, 0) x (0, 0.7071068, -0.7071068)
  line L0 (7.0711, 91.9239) -> (7.0711, 103.2376) projected
  line L1 (7.0711, 103.2376) -> (0, 96.1665) projected
  line L2 (0, 0) -> (0, 96.1665) projected
  line L3 (7.0711, 0) -> (0, 0) projected
  line L4 (7.0711, 0) -> (7.0711, 48.0833) projected
  line L5 (7.0711, 48.0833) -> (7.0711, 56.5685) projected
  line L6 (7.0711, 56.5685) -> (7.0711, 91.9239) projected
  line L7 (-5, 0) -> (-5, 96.1665) projected
  line L8 (72.832, 55.8614) -> (29.7529, 98.9406) projected
  line L9 (29.7529, 98.9406) -> (96.1665, 79.196) projected
  line L10 (96.1665, 79.196) -> (72.832, 55.8614) projected
  line L11 (68.5894, 51.6188) -> (17.6777, 102.5305) projected
  line L12 (68.5894, 51.6188) -> (40.3051, 23.3345) projected
  line L13 (40.3051, 23.3345) -> (7.0711, 56.5685) projected
  line L14 (7.0711, 48.0833) -> (7.0711, 56.5685) projected
  line L15 (36.0624, 19.0919) -> (7.0711, 48.0833) projected
  line L16 (36.0624, 19.0919) -> (12.0208, -4.9497) projected
  line L17 (12.0208, -4.9497) -> (7.0711, 0) projected
  line L18 (7.0711, 0) -> (0, 0) projected
  line L19 (19.0919, -19.0919) -> (0, 0) projected
  line L20 (26.163, -12.0208) -> (19.0919, -19.0919) projected
  line L21 (26.163, -12.0208) -> (21.2132, -7.0711) projected
  line L22 (98.9949, 70.7107) -> (21.2132, -7.0711) projected
  line L23 (98.9949, 70.7107) -> (103.9447, 65.7609) projected
  line L24 (103.9447, 65.7609) -> (111.0158, 72.832) projected
  line L25 (111.0158, 72.832) -> (100.4092, 83.4386) projected
  line L26 (100.4092, 83.4386) -> (21.9203, 106.7731) projected
  line L27 (21.9203, 106.7731) -> (10.6066, 106.7731) projected
  line L28 (10.6066, 106.7731) -> (7.0711, 103.2376) projected
  line L29 (7.0711, 91.9239) -> (7.0711, 103.2376) projected
  line L30 (17.6777, 102.5305) -> (7.0711, 91.9239) projected
  line L31 (0, 96.1665) -> (89.9839, 96.1665)
  line L32 (89.9839, 96.1665) -> (89.9839, 110.1676)
  line L33 (89.9839, 110.1676) -> (0, 110.1676)
  line L34 (0, 110.1676) -> (0, 96.1665)
  point P0 (60.1041, 31.8198)
extrude "Extrusion70" cut sketch "Skizze79" against normal blind 125.75 contours L31 L1 L0 | L0 L28 L27 L26 L31 L9 L8 L11 L30 | L30 L11 L31 | L1 L34 L33 L32 L31 L26 L27 L28 | L8 L9 L31
sketch "Skizze80" plane through (15, -60, 15) normal (1, 0, 0) x (0, 0.7071068, -0.7071068)
  line L0 (0, 96.1665) -> (-7.0711, 96.1665) projected
  line L1 (-7.0711, 0) -> (-7.0711, 96.1665) projected
  line L2 (0, 0) -> (-7.0711, 0) projected
  line L3 (0, 0) -> (0, 48.0833) projected
  line L4 (0, 48.0833) -> (0, 56.5685) projected
  line L5 (0, 56.5685) -> (0, 91.9239) projected
  line L6 (0, 91.9239) -> (0, 96.1665) projected
  line L7 (25.4558, 96.1665) -> (16.9706, 96.1665) projected
  line L8 (61.5183, 51.6188) -> (16.9706, 96.1665) projected
  line L9 (61.5183, 51.6188) -> (33.234, 23.3345) projected
  line L10 (33.234, 23.3345) -> (0, 56.5685) projected
  line L11 (0, 48.0833) -> (0, 56.5685) projected
  line L12 (28.9914, 19.0919) -> (0, 48.0833) projected
  line L13 (28.9914, 19.0919) -> (4.9497, -4.9497) projected
  line L14 (4.9497, -4.9497) -> (0, 0) projected
  line L15 (0, 0) -> (-7.0711, 0) projected
  line L16 (12.0208, -19.0919) -> (-7.0711, 0) projected
  line L17 (19.0919, -12.0208) -> (12.0208, -19.0919) projected
  line L18 (19.0919, -12.0208) -> (14.1421, -7.0711) projected
  line L19 (91.9239, 70.7107) -> (14.1421, -7.0711) projected
  line L20 (91.9239, 70.7107) -> (96.8736, 65.7609) projected
  line L21 (96.8736, 65.7609) -> (103.9447, 72.832) projected
  line L22 (103.9447, 72.832) -> (93.3381, 83.4386) projected
  line L23 (93.3381, 83.4386) -> (50.526, 96.1665) projected
  line L24 (50.526, 96.1665) -> (32.0127, 96.1665) projected
  line L25 (32.0127, 96.1665) -> (89.0955, 79.196) projected
  line L26 (89.0955, 79.196) -> (65.7609, 55.8614) projected
  line L27 (65.7609, 55.8614) -> (25.4558, 96.1665) projected
  line L28 (4.2426, 96.1665) -> (0, 96.1665) projected
  line L29 (0, 91.9239) -> (0, 96.1665) projected
  line L30 (4.2426, 96.1665) -> (0, 91.9239) projected
  line L31 (0, 96.1665) -> (0, 91.1665)
  line L32 (0, 91.1665) -> (50.526, 91.1665)
  line L33 (50.526, 91.1665) -> (50.526, 96.1665)
  line L34 (50.526, 96.1665) -> (0, 96.1665)
  point P0 (53.033, 31.8198)
  point P1 (32.0127, 96.1665)
  point P2 (25.4558, 96.1665)
  point P3 (16.9706, 96.1665)
  point P4 (4.2426, 96.1665)
  point P5 (0, 96.1665)
  dimension "d215" = 5
extrude "Extrusion71" add sketch "Skizze80" against normal blind 30 contours L28 L30 L6 | L30 L34 L8 L32 L5 | L7 L27 L32 L8 | L34 L25 L32 L27 | L24 L33 L32 L25
sketch "Skizze81" plane through (15, 55, 0) normal (0, 0, -1) x (-1, 0, 0)
  circle A0 centre (15, -10) radius 2.25
  circle A1 centre (15, -100) radius 2.25
  point P0 (15, -55)
  dimension "d220" = 4.5
  dimension "d221" = 4.5
extrude "Extrusion72" cut sketch "Skizze81" against normal blind 24.5
sketch "Skizze82" plane through (-15, 43.7273, 47.2727) normal (0, 0.7071068, 0.7071068) x (1, 0, 0)
  line L0 (-4.2426, -66.8397) -> (0, -62.5971) projected
  line L1 (0, -62.5971) -> (0, -46.2834) projected
  line L2 (5, -62.5971) -> (5, -67.5971) projected
  line L3 (0, -62.5971) -> (5, -67.5971)
  line L4 (0, -62.5971) -> (5, -67.5971)
  line L5 (5, -67.5971) -> (8.7477, -63.8494)
  line L6 (8.7477, -63.8494) -> (3.7477, -58.8494)
  line L7 (3.7477, -58.8494) -> (0, -62.5971)
  line L8 (3.7477, -58.8494) -> (0, -62.5971)
  line L9 (0, -62.5971) -> (-4.4106, -58.1865)
  line L10 (-4.4106, -58.1865) -> (-0.6629, -54.4388)
  line L11 (-0.6629, -54.4388) -> (3.7477, -58.8494)
  point P0 (15, 2.507)
  point P1 (0, -55.1017)
  dimension "d227" = 5.3
extrude "Extrusion73" cut sketch "Skizze82" against normal blind 5.3 contours L7 L6 L5 L3 | L1 L11 L7
fillet "Rundung1" radius 2.515 2 edges at (-12.5, -6.0524, 89.5542) (-11.2523, -1.6346, 85.1365)
properties part number "HalterungIso"
